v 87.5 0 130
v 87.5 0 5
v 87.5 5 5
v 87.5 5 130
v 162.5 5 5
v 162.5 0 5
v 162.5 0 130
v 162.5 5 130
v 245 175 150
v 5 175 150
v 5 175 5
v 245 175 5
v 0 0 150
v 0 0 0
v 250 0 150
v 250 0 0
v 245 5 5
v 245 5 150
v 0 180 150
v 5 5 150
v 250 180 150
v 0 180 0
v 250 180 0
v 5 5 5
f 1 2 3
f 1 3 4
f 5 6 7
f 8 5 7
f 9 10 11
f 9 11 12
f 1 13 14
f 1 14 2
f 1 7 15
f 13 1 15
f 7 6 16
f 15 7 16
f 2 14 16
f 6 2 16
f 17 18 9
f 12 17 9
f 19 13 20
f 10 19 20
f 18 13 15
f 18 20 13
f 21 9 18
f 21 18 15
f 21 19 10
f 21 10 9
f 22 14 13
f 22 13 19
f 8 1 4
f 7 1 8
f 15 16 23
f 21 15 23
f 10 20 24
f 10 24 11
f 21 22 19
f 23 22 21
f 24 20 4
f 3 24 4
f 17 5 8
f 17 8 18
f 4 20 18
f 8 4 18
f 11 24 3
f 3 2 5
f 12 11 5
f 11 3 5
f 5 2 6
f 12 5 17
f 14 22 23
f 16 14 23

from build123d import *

# Parameters (mm, degrees)
SKETCH_W        = 250
SKETCH_H        = 180
PAD_DEPTH       = 150
SKETCH001_W     = 240
SKETCH001_H     = 170
POCKET_DEPTH    = 145
SKETCH002_W     = 75
SKETCH002_H     = 125
POCKET001_DEPTH = 5


with BuildPart() as part:
    # Sketch → Pad (new body)
    with BuildSketch(Plane.XY):
        with Locations((125, 90)):
            Rectangle(SKETCH_W, SKETCH_H)
    extrude(amount=PAD_DEPTH)

    # Sketch001 (on Face6 of Pad) → Pocket (cut)
    with BuildSketch(Plane.XY.offset(150)):
        with Locations((125, 90)):
            Rectangle(SKETCH001_W, SKETCH001_H)
    extrude(amount=-POCKET_DEPTH, mode=Mode.SUBTRACT)

    # Sketch002 (on Face6 of Pocket) → Pocket001 (cut)
    with BuildSketch(Plane.XZ):
        with Locations((125, 67.5)):
            Rectangle(SKETCH002_W, SKETCH002_H)
    extrude(amount=-POCKET001_DEPTH, mode=Mode.SUBTRACT)


solid = part.part
